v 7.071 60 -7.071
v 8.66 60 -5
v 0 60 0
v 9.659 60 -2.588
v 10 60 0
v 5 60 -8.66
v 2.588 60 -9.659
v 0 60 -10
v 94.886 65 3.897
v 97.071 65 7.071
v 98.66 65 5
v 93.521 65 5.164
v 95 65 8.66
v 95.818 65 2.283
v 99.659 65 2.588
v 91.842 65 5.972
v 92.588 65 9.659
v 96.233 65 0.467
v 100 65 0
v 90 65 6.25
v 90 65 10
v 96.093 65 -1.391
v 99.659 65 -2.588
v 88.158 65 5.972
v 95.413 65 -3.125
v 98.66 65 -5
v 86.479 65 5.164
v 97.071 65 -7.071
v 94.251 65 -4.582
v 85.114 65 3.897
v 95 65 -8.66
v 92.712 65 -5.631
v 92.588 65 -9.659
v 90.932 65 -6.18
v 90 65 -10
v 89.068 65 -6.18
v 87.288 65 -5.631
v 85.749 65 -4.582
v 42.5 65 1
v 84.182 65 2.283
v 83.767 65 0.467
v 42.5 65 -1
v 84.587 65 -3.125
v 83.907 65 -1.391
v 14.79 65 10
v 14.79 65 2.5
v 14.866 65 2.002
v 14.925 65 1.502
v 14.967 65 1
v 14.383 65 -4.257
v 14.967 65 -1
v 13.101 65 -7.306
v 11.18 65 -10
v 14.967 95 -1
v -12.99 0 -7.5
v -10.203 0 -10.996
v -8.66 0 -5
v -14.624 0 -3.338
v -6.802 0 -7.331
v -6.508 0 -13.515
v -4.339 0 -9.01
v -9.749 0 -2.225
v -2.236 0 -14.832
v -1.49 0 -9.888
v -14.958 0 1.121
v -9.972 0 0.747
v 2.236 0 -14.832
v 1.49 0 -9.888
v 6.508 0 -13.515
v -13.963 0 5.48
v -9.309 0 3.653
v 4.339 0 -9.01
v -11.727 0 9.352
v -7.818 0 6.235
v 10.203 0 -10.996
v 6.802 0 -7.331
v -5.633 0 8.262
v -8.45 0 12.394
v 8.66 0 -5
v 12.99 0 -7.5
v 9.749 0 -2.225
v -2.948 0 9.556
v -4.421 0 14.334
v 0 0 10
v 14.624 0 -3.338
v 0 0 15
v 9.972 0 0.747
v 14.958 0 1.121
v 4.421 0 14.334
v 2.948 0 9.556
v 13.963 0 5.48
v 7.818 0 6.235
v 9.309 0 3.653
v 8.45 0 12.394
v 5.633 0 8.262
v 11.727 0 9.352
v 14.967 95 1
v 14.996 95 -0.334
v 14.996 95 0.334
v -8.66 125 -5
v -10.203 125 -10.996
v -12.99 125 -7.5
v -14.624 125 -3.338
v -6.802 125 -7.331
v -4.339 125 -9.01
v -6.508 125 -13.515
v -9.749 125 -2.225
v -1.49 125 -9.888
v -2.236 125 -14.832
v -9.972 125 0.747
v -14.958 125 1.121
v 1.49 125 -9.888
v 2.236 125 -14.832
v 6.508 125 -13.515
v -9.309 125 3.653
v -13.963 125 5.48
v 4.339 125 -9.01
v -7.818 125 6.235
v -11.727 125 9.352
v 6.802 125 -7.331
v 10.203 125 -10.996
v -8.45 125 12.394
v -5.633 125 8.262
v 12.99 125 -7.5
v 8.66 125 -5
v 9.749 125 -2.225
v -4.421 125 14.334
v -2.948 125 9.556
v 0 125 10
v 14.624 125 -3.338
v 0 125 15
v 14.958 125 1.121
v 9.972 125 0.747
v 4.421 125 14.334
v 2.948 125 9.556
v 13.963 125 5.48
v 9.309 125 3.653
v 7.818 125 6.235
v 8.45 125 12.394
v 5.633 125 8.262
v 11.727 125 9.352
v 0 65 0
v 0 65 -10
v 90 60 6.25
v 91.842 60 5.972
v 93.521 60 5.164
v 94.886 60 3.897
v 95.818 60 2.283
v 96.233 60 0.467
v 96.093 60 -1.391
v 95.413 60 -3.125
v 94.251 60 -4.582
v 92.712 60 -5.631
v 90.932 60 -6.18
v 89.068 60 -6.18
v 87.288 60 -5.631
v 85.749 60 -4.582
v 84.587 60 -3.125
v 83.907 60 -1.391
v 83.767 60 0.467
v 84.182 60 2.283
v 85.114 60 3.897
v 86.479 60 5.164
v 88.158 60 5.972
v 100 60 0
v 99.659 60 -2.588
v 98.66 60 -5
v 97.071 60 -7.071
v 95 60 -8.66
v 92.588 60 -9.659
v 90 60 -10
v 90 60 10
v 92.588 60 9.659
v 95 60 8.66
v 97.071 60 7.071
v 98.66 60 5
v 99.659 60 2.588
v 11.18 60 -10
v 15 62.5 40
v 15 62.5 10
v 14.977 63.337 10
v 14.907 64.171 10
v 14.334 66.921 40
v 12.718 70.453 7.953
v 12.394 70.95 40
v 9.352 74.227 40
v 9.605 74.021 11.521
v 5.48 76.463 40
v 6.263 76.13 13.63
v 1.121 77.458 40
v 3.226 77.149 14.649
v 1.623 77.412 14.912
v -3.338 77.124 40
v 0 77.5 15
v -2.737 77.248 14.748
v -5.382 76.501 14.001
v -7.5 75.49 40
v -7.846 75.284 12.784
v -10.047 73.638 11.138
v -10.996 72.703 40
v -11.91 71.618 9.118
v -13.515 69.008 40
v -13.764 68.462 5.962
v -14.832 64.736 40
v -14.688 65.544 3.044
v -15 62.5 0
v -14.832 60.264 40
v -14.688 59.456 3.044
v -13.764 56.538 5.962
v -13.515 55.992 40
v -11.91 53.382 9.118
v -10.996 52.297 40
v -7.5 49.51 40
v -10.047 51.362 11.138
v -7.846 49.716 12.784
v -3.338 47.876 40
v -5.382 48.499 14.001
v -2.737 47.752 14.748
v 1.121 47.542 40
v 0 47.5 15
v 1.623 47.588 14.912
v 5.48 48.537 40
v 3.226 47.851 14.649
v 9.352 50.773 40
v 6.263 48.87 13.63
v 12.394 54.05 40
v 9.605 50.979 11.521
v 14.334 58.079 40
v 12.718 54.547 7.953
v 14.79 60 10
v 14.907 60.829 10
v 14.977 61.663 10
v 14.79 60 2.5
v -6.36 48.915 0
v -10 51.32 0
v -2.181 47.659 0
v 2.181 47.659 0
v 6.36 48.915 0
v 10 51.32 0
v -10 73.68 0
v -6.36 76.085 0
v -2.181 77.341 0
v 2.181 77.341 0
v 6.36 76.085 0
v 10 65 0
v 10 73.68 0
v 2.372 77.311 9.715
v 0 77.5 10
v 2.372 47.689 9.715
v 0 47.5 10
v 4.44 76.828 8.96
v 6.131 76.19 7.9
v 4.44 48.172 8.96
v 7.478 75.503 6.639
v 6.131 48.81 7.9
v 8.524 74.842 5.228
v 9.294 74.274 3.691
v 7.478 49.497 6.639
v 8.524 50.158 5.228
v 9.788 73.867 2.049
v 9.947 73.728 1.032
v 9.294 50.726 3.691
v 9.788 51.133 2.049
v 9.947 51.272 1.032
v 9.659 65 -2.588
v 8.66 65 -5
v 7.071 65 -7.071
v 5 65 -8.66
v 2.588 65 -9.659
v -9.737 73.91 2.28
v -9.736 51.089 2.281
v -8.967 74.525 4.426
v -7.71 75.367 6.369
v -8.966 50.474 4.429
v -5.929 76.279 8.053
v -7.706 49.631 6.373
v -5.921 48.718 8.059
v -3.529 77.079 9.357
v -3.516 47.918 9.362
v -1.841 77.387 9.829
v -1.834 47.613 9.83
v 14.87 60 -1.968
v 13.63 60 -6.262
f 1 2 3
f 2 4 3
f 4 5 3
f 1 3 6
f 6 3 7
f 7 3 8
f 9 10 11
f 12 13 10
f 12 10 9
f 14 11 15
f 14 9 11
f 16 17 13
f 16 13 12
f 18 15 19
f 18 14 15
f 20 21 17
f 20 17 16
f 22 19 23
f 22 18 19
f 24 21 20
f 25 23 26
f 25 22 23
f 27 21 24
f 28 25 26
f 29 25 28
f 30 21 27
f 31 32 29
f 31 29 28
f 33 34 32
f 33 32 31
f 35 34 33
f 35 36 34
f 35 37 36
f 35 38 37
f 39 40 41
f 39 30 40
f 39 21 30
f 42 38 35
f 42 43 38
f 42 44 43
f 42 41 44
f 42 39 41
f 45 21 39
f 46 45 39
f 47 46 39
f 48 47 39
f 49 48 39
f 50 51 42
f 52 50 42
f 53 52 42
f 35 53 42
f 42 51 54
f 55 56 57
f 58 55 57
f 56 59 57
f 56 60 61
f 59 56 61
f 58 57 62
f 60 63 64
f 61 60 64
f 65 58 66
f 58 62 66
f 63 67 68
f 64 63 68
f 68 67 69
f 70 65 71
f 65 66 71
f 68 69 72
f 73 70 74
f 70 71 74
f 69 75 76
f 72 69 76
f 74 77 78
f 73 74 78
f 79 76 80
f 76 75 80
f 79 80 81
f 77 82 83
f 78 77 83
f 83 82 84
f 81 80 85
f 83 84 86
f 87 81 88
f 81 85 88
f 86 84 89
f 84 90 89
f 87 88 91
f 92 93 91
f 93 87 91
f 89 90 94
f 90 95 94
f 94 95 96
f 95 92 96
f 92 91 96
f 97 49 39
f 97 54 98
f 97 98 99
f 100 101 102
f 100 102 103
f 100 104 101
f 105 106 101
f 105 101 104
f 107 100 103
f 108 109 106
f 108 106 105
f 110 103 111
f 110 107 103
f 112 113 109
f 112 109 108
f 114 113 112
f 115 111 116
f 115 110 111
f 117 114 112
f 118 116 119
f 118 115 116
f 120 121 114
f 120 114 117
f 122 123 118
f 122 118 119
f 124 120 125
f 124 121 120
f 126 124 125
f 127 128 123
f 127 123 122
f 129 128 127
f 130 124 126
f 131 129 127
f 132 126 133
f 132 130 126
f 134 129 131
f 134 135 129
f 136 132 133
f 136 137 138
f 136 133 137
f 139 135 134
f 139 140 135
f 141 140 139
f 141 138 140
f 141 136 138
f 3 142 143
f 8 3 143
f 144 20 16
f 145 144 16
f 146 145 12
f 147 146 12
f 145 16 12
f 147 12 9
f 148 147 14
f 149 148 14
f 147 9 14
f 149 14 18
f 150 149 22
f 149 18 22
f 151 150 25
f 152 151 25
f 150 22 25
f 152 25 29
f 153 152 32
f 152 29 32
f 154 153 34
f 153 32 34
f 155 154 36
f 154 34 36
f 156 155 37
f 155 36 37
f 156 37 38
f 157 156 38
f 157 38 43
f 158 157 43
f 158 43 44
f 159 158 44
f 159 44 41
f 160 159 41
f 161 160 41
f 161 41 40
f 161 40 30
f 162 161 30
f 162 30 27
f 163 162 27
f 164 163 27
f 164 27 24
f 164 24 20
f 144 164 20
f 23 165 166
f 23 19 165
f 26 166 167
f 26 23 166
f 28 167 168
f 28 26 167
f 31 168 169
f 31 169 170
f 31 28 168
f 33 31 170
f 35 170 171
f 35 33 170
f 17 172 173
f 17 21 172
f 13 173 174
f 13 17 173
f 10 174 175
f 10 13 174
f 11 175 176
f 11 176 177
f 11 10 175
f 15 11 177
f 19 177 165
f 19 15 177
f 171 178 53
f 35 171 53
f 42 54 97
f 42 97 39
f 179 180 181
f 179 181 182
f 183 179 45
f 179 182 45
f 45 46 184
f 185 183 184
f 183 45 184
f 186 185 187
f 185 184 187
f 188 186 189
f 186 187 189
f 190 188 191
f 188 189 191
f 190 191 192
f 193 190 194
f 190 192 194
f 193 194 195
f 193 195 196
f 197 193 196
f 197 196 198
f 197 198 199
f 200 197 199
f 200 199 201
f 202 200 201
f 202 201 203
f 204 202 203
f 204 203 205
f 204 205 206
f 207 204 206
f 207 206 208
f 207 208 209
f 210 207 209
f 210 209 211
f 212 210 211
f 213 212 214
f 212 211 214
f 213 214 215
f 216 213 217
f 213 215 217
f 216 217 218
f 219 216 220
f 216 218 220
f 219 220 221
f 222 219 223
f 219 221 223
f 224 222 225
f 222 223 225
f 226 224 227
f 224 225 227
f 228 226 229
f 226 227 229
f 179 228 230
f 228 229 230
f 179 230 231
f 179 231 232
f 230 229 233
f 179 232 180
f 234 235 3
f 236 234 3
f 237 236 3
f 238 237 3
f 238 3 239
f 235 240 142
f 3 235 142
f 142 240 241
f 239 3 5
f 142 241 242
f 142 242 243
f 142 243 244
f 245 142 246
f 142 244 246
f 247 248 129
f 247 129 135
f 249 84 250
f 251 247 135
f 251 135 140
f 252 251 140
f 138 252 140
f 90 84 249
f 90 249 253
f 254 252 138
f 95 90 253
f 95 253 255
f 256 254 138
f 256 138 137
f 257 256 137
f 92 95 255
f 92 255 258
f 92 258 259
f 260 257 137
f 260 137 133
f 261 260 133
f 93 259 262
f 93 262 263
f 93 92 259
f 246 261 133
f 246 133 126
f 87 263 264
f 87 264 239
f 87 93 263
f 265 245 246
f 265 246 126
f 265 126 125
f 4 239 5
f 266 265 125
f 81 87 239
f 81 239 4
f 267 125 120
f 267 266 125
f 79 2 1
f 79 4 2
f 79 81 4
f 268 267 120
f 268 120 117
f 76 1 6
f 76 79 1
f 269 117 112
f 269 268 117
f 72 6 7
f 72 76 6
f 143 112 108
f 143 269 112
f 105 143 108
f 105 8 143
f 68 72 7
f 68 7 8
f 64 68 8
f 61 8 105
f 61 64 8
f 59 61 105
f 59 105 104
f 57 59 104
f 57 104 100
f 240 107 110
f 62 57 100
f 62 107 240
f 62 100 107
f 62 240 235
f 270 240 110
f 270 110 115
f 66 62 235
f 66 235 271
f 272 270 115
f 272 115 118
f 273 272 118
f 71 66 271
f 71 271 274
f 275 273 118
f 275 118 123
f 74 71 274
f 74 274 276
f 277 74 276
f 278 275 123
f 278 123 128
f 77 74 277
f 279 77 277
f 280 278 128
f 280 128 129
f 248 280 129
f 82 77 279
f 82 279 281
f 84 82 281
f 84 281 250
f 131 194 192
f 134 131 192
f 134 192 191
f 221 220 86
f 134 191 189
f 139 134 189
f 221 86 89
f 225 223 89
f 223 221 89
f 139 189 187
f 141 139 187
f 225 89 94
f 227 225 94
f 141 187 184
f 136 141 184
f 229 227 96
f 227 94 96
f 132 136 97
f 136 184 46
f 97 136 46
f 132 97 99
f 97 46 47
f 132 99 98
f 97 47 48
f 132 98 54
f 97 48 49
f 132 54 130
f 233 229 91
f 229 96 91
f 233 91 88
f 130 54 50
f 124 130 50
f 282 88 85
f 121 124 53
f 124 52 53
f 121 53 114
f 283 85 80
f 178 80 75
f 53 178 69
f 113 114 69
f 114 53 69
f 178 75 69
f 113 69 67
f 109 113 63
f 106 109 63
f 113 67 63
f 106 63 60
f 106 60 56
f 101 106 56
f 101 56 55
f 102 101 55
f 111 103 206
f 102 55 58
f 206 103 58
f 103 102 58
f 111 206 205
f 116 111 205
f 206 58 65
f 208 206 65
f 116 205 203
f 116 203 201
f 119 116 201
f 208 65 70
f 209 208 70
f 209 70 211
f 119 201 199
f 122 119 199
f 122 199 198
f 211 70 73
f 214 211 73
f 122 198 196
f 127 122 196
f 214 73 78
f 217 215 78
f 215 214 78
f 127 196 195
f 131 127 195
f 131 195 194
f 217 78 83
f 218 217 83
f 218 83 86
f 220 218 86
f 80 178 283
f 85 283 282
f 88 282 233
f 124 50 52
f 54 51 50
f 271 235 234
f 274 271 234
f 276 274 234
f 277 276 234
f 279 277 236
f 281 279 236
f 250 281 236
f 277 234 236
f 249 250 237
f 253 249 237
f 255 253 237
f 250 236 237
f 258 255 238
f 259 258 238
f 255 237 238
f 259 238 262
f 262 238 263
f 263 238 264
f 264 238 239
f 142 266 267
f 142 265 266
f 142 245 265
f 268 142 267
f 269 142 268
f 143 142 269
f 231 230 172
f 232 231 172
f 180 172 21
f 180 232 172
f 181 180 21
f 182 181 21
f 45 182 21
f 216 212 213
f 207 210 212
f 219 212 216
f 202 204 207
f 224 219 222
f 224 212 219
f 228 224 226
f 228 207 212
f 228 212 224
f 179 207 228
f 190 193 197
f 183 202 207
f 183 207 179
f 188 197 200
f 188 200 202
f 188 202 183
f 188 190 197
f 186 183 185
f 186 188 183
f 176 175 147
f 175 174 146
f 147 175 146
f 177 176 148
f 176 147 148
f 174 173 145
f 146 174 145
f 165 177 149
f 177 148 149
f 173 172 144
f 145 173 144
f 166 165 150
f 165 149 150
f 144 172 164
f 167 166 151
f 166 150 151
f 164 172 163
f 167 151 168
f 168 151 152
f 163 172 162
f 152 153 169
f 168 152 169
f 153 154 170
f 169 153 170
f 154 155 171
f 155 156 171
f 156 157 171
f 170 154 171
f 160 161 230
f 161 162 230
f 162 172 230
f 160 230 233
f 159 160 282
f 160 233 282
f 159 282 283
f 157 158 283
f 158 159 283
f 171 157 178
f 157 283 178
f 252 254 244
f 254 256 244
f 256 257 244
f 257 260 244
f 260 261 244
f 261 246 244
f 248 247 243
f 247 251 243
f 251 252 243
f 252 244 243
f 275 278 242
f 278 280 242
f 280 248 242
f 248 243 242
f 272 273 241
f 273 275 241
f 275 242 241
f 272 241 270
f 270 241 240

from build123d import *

# Parameters (mm, degrees)
SKETCH1_R           = 15
SKETCH1_R_2         = 10
BOSS_EXTRUDE1_DEPTH = 125
SKETCH2_R           = 15
BOSS_EXTRUDE2_DEPTH = 40
SKETCH6_W           = 20
SKETCH6_H           = 5
BOSS_EXTRUDE6_DEPTH = 100
FILLET1_R           = 10
SKETCH8_W           = 28
SKETCH8_H           = 2
BOSS_EXTRUDE7_DEPTH = 30
CUT_EXTRUDE1_DEPTH  = 30
SKETCH10_R          = 6.25
CUT_EXTRUDE2_DEPTH  = 30


with BuildPart() as part:
    # Sketch1 → Boss-Extrude1 (new body)
    with BuildSketch(Plane(origin=(0, 0, 0), x_dir=(1, 0, 0), z_dir=(0, 1, 0))):
        with Locations(Location((0, 0, 0), (0, 0, 270))):
            Circle(SKETCH1_R)
        with Locations(Location((0, 0, 0), (0, 0, 270))):
            Circle(SKETCH1_R_2, mode=Mode.SUBTRACT)
    extrude(amount=BOSS_EXTRUDE1_DEPTH)

    # Sketch2 → Boss-Extrude2 (add)
    with BuildSketch(Plane.XY):
        with Locations((0, 62.5)):
            Circle(SKETCH2_R)
    extrude(amount=BOSS_EXTRUDE2_DEPTH)

    # Sketch6 → Boss-Extrude6 (add)
    with BuildSketch(Plane(origin=(0, 0, 0), x_dir=(0, 0, -1), z_dir=(1, 0, 0))):
        with Locations((0, 62.5)):
            Rectangle(SKETCH6_W, SKETCH6_H)
    extrude(amount=BOSS_EXTRUDE6_DEPTH)

    # Fillet1
    fillet1_edges = [part.edges().sort_by_distance(p)[0] for p in [
        (100, 62.5, -10),
        (100, 62.5, 10),
    ]]
    fillet(fillet1_edges, radius=FILLET1_R - 0.0001)  # a hair under: the kernel refuses the full size

    # Sketch8 → Boss-Extrude7 (add)
    with BuildSketch(Plane(origin=(0, 65, 0), x_dir=(1, 0, 0), z_dir=(0, 1, 0))):
        with Locations((28.5, 0)):
            Rectangle(SKETCH8_W, SKETCH8_H)
    extrude(amount=BOSS_EXTRUDE7_DEPTH)

    # Sketch9 → Cut-Extrude1 (cut)
    with BuildSketch(Plane(origin=(0, 0, -1), x_dir=(-1, 0, 0), z_dir=(0, 0, -1))):
        Polygon((-14.966629547, 95), (-42.5, 65), (-42.5, 95), align=None)
    extrude(amount=-CUT_EXTRUDE1_DEPTH, mode=Mode.SUBTRACT)

    # Sketch10 → Cut-Extrude2 (cut)
    with BuildSketch(Plane(origin=(0, 65, 0), x_dir=(1, 0, 0), z_dir=(0, 1, 0))):
        with Locations(Location((90, 0, 0), (0, 0, 270))):
            Circle(SKETCH10_R)
    extrude(amount=-CUT_EXTRUDE2_DEPTH, mode=Mode.SUBTRACT)


solid = part.part
